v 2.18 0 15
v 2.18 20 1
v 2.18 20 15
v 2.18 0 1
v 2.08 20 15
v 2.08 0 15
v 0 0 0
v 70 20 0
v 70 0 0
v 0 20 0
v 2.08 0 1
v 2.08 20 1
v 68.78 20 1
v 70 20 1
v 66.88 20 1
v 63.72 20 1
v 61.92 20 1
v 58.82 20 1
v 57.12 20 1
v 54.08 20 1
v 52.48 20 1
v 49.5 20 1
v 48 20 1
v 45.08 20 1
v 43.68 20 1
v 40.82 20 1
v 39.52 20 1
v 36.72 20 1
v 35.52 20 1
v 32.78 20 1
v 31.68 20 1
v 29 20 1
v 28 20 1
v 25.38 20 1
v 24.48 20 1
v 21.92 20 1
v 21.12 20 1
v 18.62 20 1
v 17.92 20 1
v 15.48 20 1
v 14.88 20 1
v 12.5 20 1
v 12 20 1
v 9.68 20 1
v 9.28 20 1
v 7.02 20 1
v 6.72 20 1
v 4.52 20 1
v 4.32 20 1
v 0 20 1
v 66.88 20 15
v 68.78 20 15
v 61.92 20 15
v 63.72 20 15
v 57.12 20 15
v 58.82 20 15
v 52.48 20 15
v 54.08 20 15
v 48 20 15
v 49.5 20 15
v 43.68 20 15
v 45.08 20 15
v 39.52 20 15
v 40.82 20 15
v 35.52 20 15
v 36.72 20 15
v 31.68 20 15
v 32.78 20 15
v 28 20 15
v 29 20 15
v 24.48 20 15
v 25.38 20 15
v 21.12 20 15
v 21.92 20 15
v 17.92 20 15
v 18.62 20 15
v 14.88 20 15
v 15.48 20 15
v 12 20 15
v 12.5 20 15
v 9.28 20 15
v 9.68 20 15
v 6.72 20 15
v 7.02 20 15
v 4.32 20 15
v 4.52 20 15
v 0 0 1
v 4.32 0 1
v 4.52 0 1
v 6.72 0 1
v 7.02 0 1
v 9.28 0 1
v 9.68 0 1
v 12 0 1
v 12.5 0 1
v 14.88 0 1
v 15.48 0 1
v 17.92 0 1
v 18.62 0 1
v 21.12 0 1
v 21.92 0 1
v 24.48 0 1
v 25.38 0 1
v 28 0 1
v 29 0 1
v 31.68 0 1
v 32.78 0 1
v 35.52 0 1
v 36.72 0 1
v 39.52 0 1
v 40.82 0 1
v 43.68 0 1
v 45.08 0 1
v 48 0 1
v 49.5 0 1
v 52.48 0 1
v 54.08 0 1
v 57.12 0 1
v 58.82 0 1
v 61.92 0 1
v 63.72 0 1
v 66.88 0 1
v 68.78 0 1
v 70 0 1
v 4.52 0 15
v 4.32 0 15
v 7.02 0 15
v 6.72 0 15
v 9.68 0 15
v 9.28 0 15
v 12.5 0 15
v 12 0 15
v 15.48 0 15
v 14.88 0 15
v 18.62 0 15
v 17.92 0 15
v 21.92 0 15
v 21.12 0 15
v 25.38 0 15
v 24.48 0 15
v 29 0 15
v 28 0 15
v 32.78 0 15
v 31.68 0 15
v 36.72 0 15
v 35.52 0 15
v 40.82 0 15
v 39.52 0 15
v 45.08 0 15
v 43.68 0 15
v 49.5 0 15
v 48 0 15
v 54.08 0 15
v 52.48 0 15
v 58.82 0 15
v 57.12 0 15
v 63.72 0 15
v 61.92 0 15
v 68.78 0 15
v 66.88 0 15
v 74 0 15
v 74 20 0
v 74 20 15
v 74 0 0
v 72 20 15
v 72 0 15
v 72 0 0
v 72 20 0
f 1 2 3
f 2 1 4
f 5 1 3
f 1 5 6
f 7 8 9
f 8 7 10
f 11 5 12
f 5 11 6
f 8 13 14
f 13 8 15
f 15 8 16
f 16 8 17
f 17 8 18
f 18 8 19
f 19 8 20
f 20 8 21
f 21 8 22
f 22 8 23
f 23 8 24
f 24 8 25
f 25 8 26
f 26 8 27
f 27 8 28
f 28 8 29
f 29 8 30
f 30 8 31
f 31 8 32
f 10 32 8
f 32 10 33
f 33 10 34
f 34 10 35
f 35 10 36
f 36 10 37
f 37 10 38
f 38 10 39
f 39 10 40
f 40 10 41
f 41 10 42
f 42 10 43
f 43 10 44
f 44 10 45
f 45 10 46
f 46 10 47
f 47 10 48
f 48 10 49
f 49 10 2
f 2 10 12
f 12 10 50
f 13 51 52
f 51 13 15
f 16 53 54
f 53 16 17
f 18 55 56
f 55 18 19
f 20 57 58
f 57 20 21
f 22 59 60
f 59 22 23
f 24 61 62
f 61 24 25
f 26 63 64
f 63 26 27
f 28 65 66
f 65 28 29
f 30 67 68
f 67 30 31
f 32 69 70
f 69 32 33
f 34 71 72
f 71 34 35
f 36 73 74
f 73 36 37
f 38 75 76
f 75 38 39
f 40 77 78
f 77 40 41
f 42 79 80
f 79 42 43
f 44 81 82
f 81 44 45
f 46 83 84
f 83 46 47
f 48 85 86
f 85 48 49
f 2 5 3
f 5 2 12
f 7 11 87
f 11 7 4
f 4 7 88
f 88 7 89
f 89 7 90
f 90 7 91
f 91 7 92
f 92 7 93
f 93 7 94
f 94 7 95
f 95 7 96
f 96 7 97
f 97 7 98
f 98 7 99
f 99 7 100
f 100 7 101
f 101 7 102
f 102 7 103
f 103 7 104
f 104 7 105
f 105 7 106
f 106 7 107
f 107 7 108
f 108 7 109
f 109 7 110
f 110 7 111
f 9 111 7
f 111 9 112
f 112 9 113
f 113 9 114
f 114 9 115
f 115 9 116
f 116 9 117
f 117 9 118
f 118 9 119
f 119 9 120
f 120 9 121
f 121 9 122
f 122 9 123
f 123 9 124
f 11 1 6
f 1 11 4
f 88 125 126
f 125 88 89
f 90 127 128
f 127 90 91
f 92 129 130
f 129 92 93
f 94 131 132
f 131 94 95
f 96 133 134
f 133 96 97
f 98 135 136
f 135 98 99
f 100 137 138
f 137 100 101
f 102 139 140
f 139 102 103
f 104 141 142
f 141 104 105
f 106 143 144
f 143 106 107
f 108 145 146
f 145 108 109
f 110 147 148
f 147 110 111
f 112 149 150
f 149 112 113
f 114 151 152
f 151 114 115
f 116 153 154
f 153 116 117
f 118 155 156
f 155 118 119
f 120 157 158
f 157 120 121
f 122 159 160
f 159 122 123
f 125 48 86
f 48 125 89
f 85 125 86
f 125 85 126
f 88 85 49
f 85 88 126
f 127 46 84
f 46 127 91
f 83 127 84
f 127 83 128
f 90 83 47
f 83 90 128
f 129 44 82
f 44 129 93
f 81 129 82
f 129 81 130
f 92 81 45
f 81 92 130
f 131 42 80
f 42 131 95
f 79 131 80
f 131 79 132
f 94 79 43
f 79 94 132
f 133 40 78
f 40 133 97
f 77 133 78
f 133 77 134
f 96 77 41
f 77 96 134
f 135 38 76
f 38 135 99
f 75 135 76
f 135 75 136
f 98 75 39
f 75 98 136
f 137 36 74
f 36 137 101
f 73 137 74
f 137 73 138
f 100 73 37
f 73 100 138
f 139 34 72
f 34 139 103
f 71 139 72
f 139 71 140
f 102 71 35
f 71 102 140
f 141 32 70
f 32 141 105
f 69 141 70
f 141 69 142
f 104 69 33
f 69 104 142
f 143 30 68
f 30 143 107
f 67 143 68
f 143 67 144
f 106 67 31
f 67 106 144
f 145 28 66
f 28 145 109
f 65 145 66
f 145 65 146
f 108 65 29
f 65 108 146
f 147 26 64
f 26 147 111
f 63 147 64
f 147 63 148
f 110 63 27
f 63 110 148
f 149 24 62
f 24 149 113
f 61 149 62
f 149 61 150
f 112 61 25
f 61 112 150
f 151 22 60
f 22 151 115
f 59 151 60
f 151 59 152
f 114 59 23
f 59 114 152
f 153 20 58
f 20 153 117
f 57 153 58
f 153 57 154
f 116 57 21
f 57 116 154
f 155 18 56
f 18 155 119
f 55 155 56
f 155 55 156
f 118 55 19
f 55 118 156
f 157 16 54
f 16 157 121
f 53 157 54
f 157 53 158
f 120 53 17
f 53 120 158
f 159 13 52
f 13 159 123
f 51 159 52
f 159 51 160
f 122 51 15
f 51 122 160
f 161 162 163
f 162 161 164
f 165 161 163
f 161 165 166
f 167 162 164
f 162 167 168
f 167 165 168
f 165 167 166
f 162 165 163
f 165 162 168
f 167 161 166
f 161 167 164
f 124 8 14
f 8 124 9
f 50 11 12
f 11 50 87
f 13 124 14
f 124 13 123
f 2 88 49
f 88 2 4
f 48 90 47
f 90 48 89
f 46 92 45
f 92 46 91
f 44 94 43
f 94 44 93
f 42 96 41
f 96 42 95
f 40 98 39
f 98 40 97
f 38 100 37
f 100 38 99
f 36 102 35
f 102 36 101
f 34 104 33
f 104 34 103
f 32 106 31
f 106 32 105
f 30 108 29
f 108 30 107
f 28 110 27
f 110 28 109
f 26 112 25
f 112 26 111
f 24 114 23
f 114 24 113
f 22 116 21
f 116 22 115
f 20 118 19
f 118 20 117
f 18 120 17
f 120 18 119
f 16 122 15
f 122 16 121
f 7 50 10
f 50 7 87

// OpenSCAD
/**
 *    calibrate_walls
 *
 *    create walls thick from 0.1mm to 2mm
 * 
 *    @author         Karel Fiala
 *    @email         fiala.karel@gmail.com
 */

module calibrate_walls() {

    cube([70,20,1]);
    for (i = [0.1:0.1:2]) {
            translate([i*20 + i*i*8,0,0]) cube([i, 20, 15]);    
    }

}


// calling
calibrate_walls();
